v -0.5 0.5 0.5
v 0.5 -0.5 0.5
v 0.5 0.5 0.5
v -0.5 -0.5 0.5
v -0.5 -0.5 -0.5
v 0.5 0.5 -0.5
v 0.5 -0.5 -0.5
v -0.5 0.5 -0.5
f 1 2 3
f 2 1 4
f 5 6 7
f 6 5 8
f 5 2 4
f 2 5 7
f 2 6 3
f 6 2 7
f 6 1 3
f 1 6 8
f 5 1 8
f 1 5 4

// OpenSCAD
// file: ../../core/profile.scad
/*
 * This file is part of PolySymmetrica, a Polyhedral Geometry Modelling System.
 * Copyright 2025-2026 Susan Witts
 * SPDX-License-Identifier: MIT
 */

// Shared parameter override helpers for transform operators.
//
// INPUT FORMAT (`profile`)
// ---------------------------------
// `profile` is a list of rows. Each row targets an element kind
// ("face" | "vert" | "edge"), a selector scope, and one or more key/value
// pairs.
//
// Row schemas:
//   ["face"|"vert"|"edge", "all", ["key", value], ...]
//   ["face"|"vert"|"edge", "family", family_id, ["key", value], ...]
//   ["face"|"vert"|"edge", "id", id_or_ids, ["key", value], ...]
//
// Where:
// - `id_or_ids` may be a single index or a list of indices.
// - keys are operator-defined (examples: "df", "angle", "c", "de", "t").
//
// Precedence is fixed and deterministic:
//   id > family > all
// For the same scope/key, later rows win.
// For duplicate keys in one row, the last key/value wins.
//
// EXAMPLE INPUT
// -------------
// rows = [
//   ["face", "all", ["angle", 15]],
//   ["face", "family", 1, ["df", 0.04]],
//   ["face", "id", [2, 7], ["angle", 19]],
//   ["vert", "family", 0, ["c", 0.06]]
// ];
//
// OUTPUT FORMAT (compiled arrays)
// --------------------------------
// `ps_profile_compile_key(...)` returns a dense per-index array of length
// `count`, containing either a resolved value or `undef`.
//
// `ps_profile_compile_specs(...)` returns a list of dense arrays, one per spec,
// in the same order as `specs`.
//
// Example:
// face_fid = [0, 1, 1, 0];
// face_df = ps_profile_compile_key(rows, "face", "df", 4, face_fid);
// // => [undef, 0.04, 0.04, undef]
//
// face_angle = ps_profile_compile_key(rows, "face", "angle", 4, face_fid);
// // => [15, 15, 19, 15]
//
// specs = [
//   ["face", "df", 4, face_fid],
//   ["face", "angle", 4, face_fid]
// ];
// compiled = ps_profile_compile_specs(rows, specs);
// // => [face_df, face_angle]
//
// ACCESSOR USAGE
// --------------
// v = ps_compiled_param_get(compiled[0], face_idx); // safe bounds + undef
//
// DEBUG PRINT
// -----------
// Use `ps_profile_print(rows);` to dump normalized row interpretation.

function _ps_profile_row_kind(row) =
    (!is_list(row) || len(row) < 1) ? undef : row[0];

function _ps_profile_row_scope(row) =
    (!is_list(row) || len(row) < 2) ? undef
        : (is_string(row[1]) && (row[1] == "all" || row[1] == "family" || row[1] == "id")) ? row[1]
        : undef;

function _ps_profile_row_selector(row) =
    let(scope = _ps_profile_row_scope(row))
    (scope == "all") ? undef
        : (scope == "family") ? row[2]
        : (scope == "id") ? row[2]
        : undef;

function _ps_profile_row_kv_start(row) =
    let(scope = _ps_profile_row_scope(row))
    (scope == "family" || scope == "id") ? 3
        : (scope == "all") ? 2
        : 999999;

function _ps_profile_selector_has_id(selector, id) =
    is_undef(id) ? false
        : is_list(selector)
            ? (len([for (x = selector) if (x == id) 1]) > 0)
            : (selector == id);

function _ps_profile_row_applies(row, kind, scope, element_id=undef, family_id=undef) =
    let(
        row_kind = _ps_profile_row_kind(row),
        row_scope = _ps_profile_row_scope(row),
        selector = _ps_profile_row_selector(row)
    )
    (row_kind == kind) && (row_scope == scope) && (
        (scope == "all")
        || (scope == "family" && !is_undef(family_id) && selector == family_id)
        || (scope == "id" && _ps_profile_selector_has_id(selector, element_id))
    );

function _ps_profile_row_get(row, key) =
    let(
        start = _ps_profile_row_kv_start(row),
        vals = [
            for (i = [start:1:len(row)-1])
                let(p = row[i])
                if (is_list(p) && len(p) >= 2 && p[0] == key) p[1]
        ],
        vals2 = [for (v = vals) if (!is_undef(v)) v]
    )
    (len(vals2) == 0) ? undef : vals2[len(vals2)-1];

function ps_profile_get(profile, kind, key, element_id=undef, family_id=undef) =
    let(
        rows = is_undef(profile) ? [] : profile,
        vals_all = [for (row = rows) if (_ps_profile_row_applies(row, kind, "all", element_id, family_id)) _ps_profile_row_get(row, key)],
        vals_family = [for (row = rows) if (_ps_profile_row_applies(row, kind, "family", element_id, family_id)) _ps_profile_row_get(row, key)],
        vals_id = [for (row = rows) if (_ps_profile_row_applies(row, kind, "id", element_id, family_id)) _ps_profile_row_get(row, key)],
        all2 = [for (v = vals_all) if (!is_undef(v)) v],
        fam2 = [for (v = vals_family) if (!is_undef(v)) v],
        id2 = [for (v = vals_id) if (!is_undef(v)) v],
        v_all = (len(all2) == 0) ? undef : all2[len(all2)-1],
        v_family = (len(fam2) == 0) ? undef : fam2[len(fam2)-1],
        v_id = (len(id2) == 0) ? undef : id2[len(id2)-1]
    )
    !is_undef(v_id) ? v_id
        : !is_undef(v_family) ? v_family
        : v_all;

function ps_profile_count_kind(profile, kind) =
    is_undef(profile) ? 0
        : len([for (row = profile) if (_ps_profile_row_kind(row) == kind) 1]);

function ps_profile_row_count(profile) =
    is_undef(profile) ? 0 : len(profile);

function ps_profile_has_scope(profile, kind, scope) =
    is_undef(profile) ? false
        : (len([
            for (row = profile)
                if (_ps_profile_row_kind(row) == kind && _ps_profile_row_scope(row) == scope) 1
        ]) > 0);

function ps_profile_uses_family(profile, kind) =
    ps_profile_has_scope(profile, kind, "family");

// Compile one kind/key into a dense lookup array, optionally using a parallel
// family-id array for family-scoped matches.
function ps_profile_compile_key(profile, kind, key, count, family_ids=undef) =
    [for (idx = [0:1:max(0, count-1)])
        ps_profile_get(
            profile,
            kind,
            key,
            idx,
            (is_undef(family_ids) || idx >= len(family_ids)) ? undef : family_ids[idx]
        )
    ];

// Compile multiple specs into dense lookup arrays.
// Spec row format:
//   [kind, key, count]
//   [kind, key, count, family_ids]
function ps_profile_compile_specs(profile, specs) =
    [for (spec = specs)
        ps_profile_compile_key(
            profile,
            spec[0],
            spec[1],
            spec[2],
            (len(spec) >= 4) ? spec[3] : undef
        )
    ];

function ps_compiled_param_get(arr, idx) =
    (is_undef(arr) || idx < 0 || idx >= len(arr)) ? undef : arr[idx];

module ps_profile_print(profile) {
    rows = is_undef(profile) ? [] : profile;
    echo(str("profile: rows=", len(rows)));
    for (ri = [0:1:len(rows)-1]) {
        row = rows[ri];
        kind = _ps_profile_row_kind(row);
        scope = _ps_profile_row_scope(row);
        sel = _ps_profile_row_selector(row);
        start = _ps_profile_row_kv_start(row);
        kv = (start > len(row)-1) ? [] : [for (i = [start:1:len(row)-1]) row[i]];
        echo(str("  row#", ri, " kind=", kind, " scope=", scope, " selector=", sel, " kv=", kv));
    }
}
// main file
/*
 * This file is part of PolySymmetrica, a Polyhedral Geometry Modelling System.
 * Copyright 2025-2026 Susan Witts
 * SPDX-License-Identifier: MIT
 */

use <../../core/profile.scad>

/*
Profile basics example.

Shows that `face_fid` is a family-id array indexed by face index.
Here we use a synthetic 4-face case:

    face index:  0  1  2  3
    face_fid:   [0, 1, 1, 0]

Meaning:
- faces 0 and 3 belong to face family 0
- faces 1 and 2 belong to face family 1
*/

rows = [
    ["face", "all", ["angle", 15]],
    ["face", "family", 1, ["df", 0.04]],
    ["face", "id", [2, 3], ["angle", 19]],
    ["vert", "family", 0, ["c", 0.06]]
];

face_fid = [0, 1, 1, 0];

face_df = ps_profile_compile_key(rows, "face", "df", 4, face_fid);
face_angle = ps_profile_compile_key(rows, "face", "angle", 4, face_fid);

echo("profile example: face_fid=", face_fid);
echo("profile example: face_df=", face_df);         // [undef, 0.04, 0.04, undef]
echo("profile example: face_angle=", face_angle);   // [15, 15, 19, 19]
ps_profile_print(rows);

// Minimal geometry so this file renders to a valid STL target.
cube(1, center=true);
